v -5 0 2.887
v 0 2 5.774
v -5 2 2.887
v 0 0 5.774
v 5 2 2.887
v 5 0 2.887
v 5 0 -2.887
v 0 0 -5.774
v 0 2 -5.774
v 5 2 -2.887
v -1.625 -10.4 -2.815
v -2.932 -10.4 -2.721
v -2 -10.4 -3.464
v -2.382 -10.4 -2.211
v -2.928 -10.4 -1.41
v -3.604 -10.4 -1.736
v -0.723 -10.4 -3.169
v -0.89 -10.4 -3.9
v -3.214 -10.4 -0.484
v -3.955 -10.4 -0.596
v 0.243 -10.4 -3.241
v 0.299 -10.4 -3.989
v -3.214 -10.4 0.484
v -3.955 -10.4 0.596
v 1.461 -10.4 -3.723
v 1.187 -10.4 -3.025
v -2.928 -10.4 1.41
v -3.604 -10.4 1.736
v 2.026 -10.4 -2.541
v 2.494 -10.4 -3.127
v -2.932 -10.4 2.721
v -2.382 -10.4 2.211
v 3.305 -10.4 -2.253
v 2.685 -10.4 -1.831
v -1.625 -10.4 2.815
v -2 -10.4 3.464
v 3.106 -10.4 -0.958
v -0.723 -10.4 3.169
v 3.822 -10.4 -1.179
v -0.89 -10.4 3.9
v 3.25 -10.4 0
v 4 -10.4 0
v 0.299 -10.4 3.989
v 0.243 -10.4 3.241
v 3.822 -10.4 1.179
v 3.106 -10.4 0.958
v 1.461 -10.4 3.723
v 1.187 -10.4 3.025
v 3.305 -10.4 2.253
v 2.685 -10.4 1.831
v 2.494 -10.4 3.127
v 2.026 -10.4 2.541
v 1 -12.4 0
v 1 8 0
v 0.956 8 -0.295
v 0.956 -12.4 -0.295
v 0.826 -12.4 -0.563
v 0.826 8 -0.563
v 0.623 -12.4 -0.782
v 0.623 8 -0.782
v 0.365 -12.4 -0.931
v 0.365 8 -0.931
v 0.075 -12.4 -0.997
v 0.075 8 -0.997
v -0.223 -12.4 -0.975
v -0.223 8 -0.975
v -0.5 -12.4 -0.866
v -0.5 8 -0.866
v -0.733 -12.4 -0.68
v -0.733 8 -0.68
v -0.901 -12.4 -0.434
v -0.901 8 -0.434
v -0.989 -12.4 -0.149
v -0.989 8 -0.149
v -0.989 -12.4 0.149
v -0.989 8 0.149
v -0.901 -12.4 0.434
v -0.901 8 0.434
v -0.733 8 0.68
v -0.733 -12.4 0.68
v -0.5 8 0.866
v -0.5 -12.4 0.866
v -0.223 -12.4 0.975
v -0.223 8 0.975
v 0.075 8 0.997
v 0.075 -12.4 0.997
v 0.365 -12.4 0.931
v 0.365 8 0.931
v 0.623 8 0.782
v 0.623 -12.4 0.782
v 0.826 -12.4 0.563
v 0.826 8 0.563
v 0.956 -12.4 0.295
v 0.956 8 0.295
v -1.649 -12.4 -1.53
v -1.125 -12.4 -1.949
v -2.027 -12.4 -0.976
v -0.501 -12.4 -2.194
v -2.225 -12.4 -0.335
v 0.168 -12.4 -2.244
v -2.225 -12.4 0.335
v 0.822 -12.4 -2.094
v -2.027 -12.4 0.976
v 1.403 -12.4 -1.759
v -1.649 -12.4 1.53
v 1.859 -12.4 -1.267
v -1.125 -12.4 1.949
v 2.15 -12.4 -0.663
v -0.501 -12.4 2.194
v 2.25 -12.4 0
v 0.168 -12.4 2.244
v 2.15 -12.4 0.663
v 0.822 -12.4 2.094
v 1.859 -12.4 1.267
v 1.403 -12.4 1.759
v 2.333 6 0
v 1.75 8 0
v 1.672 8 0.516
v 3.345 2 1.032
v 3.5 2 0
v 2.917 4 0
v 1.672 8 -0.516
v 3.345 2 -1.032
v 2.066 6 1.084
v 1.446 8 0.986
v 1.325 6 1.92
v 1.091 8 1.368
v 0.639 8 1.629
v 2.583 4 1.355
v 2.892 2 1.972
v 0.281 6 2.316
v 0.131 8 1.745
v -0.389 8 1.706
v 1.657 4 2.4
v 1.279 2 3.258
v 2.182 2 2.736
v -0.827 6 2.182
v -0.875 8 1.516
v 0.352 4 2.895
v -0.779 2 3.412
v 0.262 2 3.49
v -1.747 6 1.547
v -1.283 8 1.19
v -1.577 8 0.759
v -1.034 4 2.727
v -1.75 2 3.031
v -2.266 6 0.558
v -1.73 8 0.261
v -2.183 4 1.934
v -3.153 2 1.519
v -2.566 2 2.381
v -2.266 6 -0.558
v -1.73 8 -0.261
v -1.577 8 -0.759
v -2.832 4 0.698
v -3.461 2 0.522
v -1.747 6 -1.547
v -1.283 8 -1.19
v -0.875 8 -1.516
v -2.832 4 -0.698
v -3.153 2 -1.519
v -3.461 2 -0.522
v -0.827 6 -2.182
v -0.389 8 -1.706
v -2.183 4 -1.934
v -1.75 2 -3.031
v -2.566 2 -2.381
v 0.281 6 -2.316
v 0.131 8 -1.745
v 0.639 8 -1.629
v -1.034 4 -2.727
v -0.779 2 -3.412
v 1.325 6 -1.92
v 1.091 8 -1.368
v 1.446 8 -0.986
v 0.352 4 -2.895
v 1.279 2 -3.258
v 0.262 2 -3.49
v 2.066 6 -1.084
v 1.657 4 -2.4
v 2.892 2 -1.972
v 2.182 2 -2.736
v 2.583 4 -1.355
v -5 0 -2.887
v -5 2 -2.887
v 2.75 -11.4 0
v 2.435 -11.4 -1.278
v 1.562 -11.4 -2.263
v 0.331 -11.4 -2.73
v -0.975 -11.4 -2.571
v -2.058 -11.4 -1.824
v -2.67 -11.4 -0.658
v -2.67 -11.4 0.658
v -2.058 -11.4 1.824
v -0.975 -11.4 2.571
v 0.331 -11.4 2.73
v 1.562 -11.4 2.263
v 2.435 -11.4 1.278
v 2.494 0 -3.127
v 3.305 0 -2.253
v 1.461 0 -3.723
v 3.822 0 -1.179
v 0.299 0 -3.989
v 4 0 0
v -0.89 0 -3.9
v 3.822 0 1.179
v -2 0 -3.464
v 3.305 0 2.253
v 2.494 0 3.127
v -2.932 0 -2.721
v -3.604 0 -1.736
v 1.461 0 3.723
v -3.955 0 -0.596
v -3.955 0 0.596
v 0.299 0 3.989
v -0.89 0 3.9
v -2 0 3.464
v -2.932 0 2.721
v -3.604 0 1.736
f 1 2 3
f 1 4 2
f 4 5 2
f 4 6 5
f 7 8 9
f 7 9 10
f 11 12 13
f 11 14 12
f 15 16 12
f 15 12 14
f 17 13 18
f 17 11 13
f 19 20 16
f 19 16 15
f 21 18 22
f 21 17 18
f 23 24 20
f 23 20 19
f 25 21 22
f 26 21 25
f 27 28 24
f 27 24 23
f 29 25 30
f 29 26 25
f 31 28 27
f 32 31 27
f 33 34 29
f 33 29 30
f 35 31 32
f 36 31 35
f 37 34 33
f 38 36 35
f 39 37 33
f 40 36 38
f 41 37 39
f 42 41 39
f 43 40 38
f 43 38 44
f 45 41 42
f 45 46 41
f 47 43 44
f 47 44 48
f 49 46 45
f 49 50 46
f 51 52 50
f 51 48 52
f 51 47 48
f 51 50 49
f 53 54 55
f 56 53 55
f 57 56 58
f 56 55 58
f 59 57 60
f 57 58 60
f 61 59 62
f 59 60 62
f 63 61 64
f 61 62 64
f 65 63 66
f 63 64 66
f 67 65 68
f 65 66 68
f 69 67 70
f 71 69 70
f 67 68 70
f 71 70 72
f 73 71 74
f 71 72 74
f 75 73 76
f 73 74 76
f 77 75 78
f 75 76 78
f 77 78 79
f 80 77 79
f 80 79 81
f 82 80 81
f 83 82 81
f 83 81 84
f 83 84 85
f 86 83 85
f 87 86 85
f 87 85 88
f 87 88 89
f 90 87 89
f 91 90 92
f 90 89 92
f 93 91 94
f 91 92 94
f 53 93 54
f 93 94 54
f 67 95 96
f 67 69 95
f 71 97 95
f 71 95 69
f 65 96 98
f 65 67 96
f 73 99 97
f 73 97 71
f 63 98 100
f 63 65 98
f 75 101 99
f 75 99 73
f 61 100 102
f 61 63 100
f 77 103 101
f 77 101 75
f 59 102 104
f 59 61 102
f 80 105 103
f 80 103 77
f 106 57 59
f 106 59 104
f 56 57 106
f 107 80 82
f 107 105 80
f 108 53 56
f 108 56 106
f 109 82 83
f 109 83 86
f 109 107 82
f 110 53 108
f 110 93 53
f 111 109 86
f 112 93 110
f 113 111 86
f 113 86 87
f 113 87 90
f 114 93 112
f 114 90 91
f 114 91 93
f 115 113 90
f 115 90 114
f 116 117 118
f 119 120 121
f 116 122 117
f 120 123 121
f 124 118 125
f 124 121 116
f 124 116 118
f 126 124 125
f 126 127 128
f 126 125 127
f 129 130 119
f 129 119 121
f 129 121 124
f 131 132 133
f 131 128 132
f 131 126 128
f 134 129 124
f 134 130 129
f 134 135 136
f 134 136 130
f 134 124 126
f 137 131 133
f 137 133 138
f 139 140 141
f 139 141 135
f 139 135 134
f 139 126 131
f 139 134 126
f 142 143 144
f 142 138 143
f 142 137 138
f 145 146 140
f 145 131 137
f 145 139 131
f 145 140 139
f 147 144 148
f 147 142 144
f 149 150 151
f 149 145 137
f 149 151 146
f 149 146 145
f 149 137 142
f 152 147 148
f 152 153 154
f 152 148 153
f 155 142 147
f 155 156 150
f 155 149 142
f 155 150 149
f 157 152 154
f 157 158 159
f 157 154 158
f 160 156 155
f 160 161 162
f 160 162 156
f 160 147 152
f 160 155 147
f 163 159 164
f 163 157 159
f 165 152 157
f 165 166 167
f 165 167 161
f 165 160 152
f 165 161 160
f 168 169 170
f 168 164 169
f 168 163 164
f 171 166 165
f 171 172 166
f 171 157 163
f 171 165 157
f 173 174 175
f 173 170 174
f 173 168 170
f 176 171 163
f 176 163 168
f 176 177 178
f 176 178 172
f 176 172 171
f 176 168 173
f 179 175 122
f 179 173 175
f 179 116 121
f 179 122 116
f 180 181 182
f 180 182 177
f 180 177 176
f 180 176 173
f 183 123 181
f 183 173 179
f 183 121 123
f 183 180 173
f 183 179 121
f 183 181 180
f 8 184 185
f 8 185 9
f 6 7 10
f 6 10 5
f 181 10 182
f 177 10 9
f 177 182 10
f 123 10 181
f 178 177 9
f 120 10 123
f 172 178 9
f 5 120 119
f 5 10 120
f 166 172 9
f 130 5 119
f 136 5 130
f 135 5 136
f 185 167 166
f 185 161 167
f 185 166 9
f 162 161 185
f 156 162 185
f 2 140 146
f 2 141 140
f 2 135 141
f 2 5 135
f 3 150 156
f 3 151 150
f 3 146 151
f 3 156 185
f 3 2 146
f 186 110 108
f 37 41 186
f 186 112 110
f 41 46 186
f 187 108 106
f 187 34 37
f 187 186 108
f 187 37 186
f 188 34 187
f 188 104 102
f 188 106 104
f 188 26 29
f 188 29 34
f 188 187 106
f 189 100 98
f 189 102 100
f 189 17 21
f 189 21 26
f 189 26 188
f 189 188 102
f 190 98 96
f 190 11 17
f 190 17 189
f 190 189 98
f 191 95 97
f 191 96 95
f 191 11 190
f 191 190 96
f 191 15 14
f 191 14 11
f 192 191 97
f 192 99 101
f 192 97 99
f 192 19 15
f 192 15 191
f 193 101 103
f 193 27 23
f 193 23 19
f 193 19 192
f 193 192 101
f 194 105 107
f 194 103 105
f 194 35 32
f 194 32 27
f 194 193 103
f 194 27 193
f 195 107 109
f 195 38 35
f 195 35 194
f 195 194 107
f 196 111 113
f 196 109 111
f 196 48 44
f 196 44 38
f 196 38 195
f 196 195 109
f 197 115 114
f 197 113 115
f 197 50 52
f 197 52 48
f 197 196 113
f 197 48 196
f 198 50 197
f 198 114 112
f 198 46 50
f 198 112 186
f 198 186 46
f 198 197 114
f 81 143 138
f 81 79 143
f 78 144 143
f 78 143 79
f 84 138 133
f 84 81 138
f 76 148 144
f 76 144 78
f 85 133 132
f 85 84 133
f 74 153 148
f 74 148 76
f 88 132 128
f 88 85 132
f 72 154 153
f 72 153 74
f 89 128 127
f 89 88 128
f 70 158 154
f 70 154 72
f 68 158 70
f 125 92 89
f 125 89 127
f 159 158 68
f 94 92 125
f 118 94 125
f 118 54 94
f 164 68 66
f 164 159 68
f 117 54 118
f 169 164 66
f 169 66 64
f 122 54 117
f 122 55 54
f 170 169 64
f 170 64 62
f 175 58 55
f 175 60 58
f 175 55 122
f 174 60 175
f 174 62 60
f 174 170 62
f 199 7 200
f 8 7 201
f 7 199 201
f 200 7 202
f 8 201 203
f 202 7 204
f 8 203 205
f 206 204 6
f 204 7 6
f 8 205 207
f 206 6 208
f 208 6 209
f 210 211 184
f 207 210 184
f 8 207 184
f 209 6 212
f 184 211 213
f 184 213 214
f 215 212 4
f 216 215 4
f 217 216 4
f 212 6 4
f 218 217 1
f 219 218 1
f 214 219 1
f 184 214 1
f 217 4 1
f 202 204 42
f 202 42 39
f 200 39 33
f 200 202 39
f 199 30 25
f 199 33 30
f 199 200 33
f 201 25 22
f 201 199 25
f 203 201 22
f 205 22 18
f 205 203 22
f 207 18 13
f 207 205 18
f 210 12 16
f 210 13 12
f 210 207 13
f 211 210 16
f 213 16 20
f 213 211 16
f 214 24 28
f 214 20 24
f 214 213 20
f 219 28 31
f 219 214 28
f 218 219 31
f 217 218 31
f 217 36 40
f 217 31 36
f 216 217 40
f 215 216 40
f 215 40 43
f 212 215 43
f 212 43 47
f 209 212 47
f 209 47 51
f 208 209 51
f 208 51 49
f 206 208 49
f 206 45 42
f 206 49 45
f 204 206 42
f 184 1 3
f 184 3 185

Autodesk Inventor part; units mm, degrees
ref_plane "YZ Plane" through (0, 0, 0) normal (1, 0, 0) x (0, 1, 0)
sketch "Sketch1" plane through (0, 0, 0) normal (0, 1, 0) x (-1, 0, 0)
  line L0 (0, 5.7735) -> (5, 2.8868)
  line L1 (5, 2.8868) -> (5, -2.8868)
  line L2 (5, -2.8868) -> (0, -5.7735)
  line L3 (0, -5.7735) -> (-5, -2.8868)
  line L4 (-5, -2.8868) -> (-5, 2.8868)
  line L5 (-5, 2.8868) -> (0, 5.7735)
  point P0 (0, 0)
  dimension "d24" = 10
extrude "Extrusion1" add sketch "Sketch1" along normal blind 2
sketch "Sketch2" plane through (0, 2, 0) normal (0, 1, 0) x (1, 0, 0)
  circle A0 centre (0, 0) radius 3.5
  dimension "d2" = 7
ref_plane "Work Plane1" through (0, 8, 0) normal (0, 1, 0) x (1, 0, 0)
sketch "Sketch3" plane through (0, 8, 0) normal (0, 1, 0) x (1, 0, 0)
  circle A0 centre (0, 0) radius 1.75
  dimension "d4" = 3.5
loft "Loft1" add profiles "Sketch2", "Sketch3"
sketch "Sketch4" plane through (0, 0, 0) normal (0, -1, 0) x (1, 0, 0)
  circle A0 centre (0, 0) radius 4
  dimension "d9" = 8
extrude "Extrusion2" add sketch "Sketch4" along normal blind 10.4
thread "Thread1" size "M8x1.25" class "6g" standard "ANSI Metric M Profile" length 8 offset 2.4
sketch "Sketch5" plane through (0, 8, 0) normal (0, 1, 0) x (1, 0, 0)
  circle A0 centre (0, 0) radius 1
  dimension "d14" = 2
ref_plane "Work Plane2" through (0, -12.4, 0) normal (0, -1, 0) x (1, 0, 0)
sketch "Sketch6" plane through (0, -12.4, 0) normal (0, -1, 0) x (1, 0, 0)
  circle A0 centre (0, 0) radius 2.25
  dimension "d16" = 4.5
sketch "Sketch7" plane through (0, -10.4, 0) normal (0, -1, 0) x (1, 0, 0)
  circle A0 centre (0, 0) radius 3.25
  dimension "d17" = 6.5
loft "Loft2" add profiles "Sketch7", "Sketch6"
extrude "Extrusion3" cut sketch "Sketch5" against normal up to surface (20.4 mm away)
properties part number "ZKE-Term-Solid"
